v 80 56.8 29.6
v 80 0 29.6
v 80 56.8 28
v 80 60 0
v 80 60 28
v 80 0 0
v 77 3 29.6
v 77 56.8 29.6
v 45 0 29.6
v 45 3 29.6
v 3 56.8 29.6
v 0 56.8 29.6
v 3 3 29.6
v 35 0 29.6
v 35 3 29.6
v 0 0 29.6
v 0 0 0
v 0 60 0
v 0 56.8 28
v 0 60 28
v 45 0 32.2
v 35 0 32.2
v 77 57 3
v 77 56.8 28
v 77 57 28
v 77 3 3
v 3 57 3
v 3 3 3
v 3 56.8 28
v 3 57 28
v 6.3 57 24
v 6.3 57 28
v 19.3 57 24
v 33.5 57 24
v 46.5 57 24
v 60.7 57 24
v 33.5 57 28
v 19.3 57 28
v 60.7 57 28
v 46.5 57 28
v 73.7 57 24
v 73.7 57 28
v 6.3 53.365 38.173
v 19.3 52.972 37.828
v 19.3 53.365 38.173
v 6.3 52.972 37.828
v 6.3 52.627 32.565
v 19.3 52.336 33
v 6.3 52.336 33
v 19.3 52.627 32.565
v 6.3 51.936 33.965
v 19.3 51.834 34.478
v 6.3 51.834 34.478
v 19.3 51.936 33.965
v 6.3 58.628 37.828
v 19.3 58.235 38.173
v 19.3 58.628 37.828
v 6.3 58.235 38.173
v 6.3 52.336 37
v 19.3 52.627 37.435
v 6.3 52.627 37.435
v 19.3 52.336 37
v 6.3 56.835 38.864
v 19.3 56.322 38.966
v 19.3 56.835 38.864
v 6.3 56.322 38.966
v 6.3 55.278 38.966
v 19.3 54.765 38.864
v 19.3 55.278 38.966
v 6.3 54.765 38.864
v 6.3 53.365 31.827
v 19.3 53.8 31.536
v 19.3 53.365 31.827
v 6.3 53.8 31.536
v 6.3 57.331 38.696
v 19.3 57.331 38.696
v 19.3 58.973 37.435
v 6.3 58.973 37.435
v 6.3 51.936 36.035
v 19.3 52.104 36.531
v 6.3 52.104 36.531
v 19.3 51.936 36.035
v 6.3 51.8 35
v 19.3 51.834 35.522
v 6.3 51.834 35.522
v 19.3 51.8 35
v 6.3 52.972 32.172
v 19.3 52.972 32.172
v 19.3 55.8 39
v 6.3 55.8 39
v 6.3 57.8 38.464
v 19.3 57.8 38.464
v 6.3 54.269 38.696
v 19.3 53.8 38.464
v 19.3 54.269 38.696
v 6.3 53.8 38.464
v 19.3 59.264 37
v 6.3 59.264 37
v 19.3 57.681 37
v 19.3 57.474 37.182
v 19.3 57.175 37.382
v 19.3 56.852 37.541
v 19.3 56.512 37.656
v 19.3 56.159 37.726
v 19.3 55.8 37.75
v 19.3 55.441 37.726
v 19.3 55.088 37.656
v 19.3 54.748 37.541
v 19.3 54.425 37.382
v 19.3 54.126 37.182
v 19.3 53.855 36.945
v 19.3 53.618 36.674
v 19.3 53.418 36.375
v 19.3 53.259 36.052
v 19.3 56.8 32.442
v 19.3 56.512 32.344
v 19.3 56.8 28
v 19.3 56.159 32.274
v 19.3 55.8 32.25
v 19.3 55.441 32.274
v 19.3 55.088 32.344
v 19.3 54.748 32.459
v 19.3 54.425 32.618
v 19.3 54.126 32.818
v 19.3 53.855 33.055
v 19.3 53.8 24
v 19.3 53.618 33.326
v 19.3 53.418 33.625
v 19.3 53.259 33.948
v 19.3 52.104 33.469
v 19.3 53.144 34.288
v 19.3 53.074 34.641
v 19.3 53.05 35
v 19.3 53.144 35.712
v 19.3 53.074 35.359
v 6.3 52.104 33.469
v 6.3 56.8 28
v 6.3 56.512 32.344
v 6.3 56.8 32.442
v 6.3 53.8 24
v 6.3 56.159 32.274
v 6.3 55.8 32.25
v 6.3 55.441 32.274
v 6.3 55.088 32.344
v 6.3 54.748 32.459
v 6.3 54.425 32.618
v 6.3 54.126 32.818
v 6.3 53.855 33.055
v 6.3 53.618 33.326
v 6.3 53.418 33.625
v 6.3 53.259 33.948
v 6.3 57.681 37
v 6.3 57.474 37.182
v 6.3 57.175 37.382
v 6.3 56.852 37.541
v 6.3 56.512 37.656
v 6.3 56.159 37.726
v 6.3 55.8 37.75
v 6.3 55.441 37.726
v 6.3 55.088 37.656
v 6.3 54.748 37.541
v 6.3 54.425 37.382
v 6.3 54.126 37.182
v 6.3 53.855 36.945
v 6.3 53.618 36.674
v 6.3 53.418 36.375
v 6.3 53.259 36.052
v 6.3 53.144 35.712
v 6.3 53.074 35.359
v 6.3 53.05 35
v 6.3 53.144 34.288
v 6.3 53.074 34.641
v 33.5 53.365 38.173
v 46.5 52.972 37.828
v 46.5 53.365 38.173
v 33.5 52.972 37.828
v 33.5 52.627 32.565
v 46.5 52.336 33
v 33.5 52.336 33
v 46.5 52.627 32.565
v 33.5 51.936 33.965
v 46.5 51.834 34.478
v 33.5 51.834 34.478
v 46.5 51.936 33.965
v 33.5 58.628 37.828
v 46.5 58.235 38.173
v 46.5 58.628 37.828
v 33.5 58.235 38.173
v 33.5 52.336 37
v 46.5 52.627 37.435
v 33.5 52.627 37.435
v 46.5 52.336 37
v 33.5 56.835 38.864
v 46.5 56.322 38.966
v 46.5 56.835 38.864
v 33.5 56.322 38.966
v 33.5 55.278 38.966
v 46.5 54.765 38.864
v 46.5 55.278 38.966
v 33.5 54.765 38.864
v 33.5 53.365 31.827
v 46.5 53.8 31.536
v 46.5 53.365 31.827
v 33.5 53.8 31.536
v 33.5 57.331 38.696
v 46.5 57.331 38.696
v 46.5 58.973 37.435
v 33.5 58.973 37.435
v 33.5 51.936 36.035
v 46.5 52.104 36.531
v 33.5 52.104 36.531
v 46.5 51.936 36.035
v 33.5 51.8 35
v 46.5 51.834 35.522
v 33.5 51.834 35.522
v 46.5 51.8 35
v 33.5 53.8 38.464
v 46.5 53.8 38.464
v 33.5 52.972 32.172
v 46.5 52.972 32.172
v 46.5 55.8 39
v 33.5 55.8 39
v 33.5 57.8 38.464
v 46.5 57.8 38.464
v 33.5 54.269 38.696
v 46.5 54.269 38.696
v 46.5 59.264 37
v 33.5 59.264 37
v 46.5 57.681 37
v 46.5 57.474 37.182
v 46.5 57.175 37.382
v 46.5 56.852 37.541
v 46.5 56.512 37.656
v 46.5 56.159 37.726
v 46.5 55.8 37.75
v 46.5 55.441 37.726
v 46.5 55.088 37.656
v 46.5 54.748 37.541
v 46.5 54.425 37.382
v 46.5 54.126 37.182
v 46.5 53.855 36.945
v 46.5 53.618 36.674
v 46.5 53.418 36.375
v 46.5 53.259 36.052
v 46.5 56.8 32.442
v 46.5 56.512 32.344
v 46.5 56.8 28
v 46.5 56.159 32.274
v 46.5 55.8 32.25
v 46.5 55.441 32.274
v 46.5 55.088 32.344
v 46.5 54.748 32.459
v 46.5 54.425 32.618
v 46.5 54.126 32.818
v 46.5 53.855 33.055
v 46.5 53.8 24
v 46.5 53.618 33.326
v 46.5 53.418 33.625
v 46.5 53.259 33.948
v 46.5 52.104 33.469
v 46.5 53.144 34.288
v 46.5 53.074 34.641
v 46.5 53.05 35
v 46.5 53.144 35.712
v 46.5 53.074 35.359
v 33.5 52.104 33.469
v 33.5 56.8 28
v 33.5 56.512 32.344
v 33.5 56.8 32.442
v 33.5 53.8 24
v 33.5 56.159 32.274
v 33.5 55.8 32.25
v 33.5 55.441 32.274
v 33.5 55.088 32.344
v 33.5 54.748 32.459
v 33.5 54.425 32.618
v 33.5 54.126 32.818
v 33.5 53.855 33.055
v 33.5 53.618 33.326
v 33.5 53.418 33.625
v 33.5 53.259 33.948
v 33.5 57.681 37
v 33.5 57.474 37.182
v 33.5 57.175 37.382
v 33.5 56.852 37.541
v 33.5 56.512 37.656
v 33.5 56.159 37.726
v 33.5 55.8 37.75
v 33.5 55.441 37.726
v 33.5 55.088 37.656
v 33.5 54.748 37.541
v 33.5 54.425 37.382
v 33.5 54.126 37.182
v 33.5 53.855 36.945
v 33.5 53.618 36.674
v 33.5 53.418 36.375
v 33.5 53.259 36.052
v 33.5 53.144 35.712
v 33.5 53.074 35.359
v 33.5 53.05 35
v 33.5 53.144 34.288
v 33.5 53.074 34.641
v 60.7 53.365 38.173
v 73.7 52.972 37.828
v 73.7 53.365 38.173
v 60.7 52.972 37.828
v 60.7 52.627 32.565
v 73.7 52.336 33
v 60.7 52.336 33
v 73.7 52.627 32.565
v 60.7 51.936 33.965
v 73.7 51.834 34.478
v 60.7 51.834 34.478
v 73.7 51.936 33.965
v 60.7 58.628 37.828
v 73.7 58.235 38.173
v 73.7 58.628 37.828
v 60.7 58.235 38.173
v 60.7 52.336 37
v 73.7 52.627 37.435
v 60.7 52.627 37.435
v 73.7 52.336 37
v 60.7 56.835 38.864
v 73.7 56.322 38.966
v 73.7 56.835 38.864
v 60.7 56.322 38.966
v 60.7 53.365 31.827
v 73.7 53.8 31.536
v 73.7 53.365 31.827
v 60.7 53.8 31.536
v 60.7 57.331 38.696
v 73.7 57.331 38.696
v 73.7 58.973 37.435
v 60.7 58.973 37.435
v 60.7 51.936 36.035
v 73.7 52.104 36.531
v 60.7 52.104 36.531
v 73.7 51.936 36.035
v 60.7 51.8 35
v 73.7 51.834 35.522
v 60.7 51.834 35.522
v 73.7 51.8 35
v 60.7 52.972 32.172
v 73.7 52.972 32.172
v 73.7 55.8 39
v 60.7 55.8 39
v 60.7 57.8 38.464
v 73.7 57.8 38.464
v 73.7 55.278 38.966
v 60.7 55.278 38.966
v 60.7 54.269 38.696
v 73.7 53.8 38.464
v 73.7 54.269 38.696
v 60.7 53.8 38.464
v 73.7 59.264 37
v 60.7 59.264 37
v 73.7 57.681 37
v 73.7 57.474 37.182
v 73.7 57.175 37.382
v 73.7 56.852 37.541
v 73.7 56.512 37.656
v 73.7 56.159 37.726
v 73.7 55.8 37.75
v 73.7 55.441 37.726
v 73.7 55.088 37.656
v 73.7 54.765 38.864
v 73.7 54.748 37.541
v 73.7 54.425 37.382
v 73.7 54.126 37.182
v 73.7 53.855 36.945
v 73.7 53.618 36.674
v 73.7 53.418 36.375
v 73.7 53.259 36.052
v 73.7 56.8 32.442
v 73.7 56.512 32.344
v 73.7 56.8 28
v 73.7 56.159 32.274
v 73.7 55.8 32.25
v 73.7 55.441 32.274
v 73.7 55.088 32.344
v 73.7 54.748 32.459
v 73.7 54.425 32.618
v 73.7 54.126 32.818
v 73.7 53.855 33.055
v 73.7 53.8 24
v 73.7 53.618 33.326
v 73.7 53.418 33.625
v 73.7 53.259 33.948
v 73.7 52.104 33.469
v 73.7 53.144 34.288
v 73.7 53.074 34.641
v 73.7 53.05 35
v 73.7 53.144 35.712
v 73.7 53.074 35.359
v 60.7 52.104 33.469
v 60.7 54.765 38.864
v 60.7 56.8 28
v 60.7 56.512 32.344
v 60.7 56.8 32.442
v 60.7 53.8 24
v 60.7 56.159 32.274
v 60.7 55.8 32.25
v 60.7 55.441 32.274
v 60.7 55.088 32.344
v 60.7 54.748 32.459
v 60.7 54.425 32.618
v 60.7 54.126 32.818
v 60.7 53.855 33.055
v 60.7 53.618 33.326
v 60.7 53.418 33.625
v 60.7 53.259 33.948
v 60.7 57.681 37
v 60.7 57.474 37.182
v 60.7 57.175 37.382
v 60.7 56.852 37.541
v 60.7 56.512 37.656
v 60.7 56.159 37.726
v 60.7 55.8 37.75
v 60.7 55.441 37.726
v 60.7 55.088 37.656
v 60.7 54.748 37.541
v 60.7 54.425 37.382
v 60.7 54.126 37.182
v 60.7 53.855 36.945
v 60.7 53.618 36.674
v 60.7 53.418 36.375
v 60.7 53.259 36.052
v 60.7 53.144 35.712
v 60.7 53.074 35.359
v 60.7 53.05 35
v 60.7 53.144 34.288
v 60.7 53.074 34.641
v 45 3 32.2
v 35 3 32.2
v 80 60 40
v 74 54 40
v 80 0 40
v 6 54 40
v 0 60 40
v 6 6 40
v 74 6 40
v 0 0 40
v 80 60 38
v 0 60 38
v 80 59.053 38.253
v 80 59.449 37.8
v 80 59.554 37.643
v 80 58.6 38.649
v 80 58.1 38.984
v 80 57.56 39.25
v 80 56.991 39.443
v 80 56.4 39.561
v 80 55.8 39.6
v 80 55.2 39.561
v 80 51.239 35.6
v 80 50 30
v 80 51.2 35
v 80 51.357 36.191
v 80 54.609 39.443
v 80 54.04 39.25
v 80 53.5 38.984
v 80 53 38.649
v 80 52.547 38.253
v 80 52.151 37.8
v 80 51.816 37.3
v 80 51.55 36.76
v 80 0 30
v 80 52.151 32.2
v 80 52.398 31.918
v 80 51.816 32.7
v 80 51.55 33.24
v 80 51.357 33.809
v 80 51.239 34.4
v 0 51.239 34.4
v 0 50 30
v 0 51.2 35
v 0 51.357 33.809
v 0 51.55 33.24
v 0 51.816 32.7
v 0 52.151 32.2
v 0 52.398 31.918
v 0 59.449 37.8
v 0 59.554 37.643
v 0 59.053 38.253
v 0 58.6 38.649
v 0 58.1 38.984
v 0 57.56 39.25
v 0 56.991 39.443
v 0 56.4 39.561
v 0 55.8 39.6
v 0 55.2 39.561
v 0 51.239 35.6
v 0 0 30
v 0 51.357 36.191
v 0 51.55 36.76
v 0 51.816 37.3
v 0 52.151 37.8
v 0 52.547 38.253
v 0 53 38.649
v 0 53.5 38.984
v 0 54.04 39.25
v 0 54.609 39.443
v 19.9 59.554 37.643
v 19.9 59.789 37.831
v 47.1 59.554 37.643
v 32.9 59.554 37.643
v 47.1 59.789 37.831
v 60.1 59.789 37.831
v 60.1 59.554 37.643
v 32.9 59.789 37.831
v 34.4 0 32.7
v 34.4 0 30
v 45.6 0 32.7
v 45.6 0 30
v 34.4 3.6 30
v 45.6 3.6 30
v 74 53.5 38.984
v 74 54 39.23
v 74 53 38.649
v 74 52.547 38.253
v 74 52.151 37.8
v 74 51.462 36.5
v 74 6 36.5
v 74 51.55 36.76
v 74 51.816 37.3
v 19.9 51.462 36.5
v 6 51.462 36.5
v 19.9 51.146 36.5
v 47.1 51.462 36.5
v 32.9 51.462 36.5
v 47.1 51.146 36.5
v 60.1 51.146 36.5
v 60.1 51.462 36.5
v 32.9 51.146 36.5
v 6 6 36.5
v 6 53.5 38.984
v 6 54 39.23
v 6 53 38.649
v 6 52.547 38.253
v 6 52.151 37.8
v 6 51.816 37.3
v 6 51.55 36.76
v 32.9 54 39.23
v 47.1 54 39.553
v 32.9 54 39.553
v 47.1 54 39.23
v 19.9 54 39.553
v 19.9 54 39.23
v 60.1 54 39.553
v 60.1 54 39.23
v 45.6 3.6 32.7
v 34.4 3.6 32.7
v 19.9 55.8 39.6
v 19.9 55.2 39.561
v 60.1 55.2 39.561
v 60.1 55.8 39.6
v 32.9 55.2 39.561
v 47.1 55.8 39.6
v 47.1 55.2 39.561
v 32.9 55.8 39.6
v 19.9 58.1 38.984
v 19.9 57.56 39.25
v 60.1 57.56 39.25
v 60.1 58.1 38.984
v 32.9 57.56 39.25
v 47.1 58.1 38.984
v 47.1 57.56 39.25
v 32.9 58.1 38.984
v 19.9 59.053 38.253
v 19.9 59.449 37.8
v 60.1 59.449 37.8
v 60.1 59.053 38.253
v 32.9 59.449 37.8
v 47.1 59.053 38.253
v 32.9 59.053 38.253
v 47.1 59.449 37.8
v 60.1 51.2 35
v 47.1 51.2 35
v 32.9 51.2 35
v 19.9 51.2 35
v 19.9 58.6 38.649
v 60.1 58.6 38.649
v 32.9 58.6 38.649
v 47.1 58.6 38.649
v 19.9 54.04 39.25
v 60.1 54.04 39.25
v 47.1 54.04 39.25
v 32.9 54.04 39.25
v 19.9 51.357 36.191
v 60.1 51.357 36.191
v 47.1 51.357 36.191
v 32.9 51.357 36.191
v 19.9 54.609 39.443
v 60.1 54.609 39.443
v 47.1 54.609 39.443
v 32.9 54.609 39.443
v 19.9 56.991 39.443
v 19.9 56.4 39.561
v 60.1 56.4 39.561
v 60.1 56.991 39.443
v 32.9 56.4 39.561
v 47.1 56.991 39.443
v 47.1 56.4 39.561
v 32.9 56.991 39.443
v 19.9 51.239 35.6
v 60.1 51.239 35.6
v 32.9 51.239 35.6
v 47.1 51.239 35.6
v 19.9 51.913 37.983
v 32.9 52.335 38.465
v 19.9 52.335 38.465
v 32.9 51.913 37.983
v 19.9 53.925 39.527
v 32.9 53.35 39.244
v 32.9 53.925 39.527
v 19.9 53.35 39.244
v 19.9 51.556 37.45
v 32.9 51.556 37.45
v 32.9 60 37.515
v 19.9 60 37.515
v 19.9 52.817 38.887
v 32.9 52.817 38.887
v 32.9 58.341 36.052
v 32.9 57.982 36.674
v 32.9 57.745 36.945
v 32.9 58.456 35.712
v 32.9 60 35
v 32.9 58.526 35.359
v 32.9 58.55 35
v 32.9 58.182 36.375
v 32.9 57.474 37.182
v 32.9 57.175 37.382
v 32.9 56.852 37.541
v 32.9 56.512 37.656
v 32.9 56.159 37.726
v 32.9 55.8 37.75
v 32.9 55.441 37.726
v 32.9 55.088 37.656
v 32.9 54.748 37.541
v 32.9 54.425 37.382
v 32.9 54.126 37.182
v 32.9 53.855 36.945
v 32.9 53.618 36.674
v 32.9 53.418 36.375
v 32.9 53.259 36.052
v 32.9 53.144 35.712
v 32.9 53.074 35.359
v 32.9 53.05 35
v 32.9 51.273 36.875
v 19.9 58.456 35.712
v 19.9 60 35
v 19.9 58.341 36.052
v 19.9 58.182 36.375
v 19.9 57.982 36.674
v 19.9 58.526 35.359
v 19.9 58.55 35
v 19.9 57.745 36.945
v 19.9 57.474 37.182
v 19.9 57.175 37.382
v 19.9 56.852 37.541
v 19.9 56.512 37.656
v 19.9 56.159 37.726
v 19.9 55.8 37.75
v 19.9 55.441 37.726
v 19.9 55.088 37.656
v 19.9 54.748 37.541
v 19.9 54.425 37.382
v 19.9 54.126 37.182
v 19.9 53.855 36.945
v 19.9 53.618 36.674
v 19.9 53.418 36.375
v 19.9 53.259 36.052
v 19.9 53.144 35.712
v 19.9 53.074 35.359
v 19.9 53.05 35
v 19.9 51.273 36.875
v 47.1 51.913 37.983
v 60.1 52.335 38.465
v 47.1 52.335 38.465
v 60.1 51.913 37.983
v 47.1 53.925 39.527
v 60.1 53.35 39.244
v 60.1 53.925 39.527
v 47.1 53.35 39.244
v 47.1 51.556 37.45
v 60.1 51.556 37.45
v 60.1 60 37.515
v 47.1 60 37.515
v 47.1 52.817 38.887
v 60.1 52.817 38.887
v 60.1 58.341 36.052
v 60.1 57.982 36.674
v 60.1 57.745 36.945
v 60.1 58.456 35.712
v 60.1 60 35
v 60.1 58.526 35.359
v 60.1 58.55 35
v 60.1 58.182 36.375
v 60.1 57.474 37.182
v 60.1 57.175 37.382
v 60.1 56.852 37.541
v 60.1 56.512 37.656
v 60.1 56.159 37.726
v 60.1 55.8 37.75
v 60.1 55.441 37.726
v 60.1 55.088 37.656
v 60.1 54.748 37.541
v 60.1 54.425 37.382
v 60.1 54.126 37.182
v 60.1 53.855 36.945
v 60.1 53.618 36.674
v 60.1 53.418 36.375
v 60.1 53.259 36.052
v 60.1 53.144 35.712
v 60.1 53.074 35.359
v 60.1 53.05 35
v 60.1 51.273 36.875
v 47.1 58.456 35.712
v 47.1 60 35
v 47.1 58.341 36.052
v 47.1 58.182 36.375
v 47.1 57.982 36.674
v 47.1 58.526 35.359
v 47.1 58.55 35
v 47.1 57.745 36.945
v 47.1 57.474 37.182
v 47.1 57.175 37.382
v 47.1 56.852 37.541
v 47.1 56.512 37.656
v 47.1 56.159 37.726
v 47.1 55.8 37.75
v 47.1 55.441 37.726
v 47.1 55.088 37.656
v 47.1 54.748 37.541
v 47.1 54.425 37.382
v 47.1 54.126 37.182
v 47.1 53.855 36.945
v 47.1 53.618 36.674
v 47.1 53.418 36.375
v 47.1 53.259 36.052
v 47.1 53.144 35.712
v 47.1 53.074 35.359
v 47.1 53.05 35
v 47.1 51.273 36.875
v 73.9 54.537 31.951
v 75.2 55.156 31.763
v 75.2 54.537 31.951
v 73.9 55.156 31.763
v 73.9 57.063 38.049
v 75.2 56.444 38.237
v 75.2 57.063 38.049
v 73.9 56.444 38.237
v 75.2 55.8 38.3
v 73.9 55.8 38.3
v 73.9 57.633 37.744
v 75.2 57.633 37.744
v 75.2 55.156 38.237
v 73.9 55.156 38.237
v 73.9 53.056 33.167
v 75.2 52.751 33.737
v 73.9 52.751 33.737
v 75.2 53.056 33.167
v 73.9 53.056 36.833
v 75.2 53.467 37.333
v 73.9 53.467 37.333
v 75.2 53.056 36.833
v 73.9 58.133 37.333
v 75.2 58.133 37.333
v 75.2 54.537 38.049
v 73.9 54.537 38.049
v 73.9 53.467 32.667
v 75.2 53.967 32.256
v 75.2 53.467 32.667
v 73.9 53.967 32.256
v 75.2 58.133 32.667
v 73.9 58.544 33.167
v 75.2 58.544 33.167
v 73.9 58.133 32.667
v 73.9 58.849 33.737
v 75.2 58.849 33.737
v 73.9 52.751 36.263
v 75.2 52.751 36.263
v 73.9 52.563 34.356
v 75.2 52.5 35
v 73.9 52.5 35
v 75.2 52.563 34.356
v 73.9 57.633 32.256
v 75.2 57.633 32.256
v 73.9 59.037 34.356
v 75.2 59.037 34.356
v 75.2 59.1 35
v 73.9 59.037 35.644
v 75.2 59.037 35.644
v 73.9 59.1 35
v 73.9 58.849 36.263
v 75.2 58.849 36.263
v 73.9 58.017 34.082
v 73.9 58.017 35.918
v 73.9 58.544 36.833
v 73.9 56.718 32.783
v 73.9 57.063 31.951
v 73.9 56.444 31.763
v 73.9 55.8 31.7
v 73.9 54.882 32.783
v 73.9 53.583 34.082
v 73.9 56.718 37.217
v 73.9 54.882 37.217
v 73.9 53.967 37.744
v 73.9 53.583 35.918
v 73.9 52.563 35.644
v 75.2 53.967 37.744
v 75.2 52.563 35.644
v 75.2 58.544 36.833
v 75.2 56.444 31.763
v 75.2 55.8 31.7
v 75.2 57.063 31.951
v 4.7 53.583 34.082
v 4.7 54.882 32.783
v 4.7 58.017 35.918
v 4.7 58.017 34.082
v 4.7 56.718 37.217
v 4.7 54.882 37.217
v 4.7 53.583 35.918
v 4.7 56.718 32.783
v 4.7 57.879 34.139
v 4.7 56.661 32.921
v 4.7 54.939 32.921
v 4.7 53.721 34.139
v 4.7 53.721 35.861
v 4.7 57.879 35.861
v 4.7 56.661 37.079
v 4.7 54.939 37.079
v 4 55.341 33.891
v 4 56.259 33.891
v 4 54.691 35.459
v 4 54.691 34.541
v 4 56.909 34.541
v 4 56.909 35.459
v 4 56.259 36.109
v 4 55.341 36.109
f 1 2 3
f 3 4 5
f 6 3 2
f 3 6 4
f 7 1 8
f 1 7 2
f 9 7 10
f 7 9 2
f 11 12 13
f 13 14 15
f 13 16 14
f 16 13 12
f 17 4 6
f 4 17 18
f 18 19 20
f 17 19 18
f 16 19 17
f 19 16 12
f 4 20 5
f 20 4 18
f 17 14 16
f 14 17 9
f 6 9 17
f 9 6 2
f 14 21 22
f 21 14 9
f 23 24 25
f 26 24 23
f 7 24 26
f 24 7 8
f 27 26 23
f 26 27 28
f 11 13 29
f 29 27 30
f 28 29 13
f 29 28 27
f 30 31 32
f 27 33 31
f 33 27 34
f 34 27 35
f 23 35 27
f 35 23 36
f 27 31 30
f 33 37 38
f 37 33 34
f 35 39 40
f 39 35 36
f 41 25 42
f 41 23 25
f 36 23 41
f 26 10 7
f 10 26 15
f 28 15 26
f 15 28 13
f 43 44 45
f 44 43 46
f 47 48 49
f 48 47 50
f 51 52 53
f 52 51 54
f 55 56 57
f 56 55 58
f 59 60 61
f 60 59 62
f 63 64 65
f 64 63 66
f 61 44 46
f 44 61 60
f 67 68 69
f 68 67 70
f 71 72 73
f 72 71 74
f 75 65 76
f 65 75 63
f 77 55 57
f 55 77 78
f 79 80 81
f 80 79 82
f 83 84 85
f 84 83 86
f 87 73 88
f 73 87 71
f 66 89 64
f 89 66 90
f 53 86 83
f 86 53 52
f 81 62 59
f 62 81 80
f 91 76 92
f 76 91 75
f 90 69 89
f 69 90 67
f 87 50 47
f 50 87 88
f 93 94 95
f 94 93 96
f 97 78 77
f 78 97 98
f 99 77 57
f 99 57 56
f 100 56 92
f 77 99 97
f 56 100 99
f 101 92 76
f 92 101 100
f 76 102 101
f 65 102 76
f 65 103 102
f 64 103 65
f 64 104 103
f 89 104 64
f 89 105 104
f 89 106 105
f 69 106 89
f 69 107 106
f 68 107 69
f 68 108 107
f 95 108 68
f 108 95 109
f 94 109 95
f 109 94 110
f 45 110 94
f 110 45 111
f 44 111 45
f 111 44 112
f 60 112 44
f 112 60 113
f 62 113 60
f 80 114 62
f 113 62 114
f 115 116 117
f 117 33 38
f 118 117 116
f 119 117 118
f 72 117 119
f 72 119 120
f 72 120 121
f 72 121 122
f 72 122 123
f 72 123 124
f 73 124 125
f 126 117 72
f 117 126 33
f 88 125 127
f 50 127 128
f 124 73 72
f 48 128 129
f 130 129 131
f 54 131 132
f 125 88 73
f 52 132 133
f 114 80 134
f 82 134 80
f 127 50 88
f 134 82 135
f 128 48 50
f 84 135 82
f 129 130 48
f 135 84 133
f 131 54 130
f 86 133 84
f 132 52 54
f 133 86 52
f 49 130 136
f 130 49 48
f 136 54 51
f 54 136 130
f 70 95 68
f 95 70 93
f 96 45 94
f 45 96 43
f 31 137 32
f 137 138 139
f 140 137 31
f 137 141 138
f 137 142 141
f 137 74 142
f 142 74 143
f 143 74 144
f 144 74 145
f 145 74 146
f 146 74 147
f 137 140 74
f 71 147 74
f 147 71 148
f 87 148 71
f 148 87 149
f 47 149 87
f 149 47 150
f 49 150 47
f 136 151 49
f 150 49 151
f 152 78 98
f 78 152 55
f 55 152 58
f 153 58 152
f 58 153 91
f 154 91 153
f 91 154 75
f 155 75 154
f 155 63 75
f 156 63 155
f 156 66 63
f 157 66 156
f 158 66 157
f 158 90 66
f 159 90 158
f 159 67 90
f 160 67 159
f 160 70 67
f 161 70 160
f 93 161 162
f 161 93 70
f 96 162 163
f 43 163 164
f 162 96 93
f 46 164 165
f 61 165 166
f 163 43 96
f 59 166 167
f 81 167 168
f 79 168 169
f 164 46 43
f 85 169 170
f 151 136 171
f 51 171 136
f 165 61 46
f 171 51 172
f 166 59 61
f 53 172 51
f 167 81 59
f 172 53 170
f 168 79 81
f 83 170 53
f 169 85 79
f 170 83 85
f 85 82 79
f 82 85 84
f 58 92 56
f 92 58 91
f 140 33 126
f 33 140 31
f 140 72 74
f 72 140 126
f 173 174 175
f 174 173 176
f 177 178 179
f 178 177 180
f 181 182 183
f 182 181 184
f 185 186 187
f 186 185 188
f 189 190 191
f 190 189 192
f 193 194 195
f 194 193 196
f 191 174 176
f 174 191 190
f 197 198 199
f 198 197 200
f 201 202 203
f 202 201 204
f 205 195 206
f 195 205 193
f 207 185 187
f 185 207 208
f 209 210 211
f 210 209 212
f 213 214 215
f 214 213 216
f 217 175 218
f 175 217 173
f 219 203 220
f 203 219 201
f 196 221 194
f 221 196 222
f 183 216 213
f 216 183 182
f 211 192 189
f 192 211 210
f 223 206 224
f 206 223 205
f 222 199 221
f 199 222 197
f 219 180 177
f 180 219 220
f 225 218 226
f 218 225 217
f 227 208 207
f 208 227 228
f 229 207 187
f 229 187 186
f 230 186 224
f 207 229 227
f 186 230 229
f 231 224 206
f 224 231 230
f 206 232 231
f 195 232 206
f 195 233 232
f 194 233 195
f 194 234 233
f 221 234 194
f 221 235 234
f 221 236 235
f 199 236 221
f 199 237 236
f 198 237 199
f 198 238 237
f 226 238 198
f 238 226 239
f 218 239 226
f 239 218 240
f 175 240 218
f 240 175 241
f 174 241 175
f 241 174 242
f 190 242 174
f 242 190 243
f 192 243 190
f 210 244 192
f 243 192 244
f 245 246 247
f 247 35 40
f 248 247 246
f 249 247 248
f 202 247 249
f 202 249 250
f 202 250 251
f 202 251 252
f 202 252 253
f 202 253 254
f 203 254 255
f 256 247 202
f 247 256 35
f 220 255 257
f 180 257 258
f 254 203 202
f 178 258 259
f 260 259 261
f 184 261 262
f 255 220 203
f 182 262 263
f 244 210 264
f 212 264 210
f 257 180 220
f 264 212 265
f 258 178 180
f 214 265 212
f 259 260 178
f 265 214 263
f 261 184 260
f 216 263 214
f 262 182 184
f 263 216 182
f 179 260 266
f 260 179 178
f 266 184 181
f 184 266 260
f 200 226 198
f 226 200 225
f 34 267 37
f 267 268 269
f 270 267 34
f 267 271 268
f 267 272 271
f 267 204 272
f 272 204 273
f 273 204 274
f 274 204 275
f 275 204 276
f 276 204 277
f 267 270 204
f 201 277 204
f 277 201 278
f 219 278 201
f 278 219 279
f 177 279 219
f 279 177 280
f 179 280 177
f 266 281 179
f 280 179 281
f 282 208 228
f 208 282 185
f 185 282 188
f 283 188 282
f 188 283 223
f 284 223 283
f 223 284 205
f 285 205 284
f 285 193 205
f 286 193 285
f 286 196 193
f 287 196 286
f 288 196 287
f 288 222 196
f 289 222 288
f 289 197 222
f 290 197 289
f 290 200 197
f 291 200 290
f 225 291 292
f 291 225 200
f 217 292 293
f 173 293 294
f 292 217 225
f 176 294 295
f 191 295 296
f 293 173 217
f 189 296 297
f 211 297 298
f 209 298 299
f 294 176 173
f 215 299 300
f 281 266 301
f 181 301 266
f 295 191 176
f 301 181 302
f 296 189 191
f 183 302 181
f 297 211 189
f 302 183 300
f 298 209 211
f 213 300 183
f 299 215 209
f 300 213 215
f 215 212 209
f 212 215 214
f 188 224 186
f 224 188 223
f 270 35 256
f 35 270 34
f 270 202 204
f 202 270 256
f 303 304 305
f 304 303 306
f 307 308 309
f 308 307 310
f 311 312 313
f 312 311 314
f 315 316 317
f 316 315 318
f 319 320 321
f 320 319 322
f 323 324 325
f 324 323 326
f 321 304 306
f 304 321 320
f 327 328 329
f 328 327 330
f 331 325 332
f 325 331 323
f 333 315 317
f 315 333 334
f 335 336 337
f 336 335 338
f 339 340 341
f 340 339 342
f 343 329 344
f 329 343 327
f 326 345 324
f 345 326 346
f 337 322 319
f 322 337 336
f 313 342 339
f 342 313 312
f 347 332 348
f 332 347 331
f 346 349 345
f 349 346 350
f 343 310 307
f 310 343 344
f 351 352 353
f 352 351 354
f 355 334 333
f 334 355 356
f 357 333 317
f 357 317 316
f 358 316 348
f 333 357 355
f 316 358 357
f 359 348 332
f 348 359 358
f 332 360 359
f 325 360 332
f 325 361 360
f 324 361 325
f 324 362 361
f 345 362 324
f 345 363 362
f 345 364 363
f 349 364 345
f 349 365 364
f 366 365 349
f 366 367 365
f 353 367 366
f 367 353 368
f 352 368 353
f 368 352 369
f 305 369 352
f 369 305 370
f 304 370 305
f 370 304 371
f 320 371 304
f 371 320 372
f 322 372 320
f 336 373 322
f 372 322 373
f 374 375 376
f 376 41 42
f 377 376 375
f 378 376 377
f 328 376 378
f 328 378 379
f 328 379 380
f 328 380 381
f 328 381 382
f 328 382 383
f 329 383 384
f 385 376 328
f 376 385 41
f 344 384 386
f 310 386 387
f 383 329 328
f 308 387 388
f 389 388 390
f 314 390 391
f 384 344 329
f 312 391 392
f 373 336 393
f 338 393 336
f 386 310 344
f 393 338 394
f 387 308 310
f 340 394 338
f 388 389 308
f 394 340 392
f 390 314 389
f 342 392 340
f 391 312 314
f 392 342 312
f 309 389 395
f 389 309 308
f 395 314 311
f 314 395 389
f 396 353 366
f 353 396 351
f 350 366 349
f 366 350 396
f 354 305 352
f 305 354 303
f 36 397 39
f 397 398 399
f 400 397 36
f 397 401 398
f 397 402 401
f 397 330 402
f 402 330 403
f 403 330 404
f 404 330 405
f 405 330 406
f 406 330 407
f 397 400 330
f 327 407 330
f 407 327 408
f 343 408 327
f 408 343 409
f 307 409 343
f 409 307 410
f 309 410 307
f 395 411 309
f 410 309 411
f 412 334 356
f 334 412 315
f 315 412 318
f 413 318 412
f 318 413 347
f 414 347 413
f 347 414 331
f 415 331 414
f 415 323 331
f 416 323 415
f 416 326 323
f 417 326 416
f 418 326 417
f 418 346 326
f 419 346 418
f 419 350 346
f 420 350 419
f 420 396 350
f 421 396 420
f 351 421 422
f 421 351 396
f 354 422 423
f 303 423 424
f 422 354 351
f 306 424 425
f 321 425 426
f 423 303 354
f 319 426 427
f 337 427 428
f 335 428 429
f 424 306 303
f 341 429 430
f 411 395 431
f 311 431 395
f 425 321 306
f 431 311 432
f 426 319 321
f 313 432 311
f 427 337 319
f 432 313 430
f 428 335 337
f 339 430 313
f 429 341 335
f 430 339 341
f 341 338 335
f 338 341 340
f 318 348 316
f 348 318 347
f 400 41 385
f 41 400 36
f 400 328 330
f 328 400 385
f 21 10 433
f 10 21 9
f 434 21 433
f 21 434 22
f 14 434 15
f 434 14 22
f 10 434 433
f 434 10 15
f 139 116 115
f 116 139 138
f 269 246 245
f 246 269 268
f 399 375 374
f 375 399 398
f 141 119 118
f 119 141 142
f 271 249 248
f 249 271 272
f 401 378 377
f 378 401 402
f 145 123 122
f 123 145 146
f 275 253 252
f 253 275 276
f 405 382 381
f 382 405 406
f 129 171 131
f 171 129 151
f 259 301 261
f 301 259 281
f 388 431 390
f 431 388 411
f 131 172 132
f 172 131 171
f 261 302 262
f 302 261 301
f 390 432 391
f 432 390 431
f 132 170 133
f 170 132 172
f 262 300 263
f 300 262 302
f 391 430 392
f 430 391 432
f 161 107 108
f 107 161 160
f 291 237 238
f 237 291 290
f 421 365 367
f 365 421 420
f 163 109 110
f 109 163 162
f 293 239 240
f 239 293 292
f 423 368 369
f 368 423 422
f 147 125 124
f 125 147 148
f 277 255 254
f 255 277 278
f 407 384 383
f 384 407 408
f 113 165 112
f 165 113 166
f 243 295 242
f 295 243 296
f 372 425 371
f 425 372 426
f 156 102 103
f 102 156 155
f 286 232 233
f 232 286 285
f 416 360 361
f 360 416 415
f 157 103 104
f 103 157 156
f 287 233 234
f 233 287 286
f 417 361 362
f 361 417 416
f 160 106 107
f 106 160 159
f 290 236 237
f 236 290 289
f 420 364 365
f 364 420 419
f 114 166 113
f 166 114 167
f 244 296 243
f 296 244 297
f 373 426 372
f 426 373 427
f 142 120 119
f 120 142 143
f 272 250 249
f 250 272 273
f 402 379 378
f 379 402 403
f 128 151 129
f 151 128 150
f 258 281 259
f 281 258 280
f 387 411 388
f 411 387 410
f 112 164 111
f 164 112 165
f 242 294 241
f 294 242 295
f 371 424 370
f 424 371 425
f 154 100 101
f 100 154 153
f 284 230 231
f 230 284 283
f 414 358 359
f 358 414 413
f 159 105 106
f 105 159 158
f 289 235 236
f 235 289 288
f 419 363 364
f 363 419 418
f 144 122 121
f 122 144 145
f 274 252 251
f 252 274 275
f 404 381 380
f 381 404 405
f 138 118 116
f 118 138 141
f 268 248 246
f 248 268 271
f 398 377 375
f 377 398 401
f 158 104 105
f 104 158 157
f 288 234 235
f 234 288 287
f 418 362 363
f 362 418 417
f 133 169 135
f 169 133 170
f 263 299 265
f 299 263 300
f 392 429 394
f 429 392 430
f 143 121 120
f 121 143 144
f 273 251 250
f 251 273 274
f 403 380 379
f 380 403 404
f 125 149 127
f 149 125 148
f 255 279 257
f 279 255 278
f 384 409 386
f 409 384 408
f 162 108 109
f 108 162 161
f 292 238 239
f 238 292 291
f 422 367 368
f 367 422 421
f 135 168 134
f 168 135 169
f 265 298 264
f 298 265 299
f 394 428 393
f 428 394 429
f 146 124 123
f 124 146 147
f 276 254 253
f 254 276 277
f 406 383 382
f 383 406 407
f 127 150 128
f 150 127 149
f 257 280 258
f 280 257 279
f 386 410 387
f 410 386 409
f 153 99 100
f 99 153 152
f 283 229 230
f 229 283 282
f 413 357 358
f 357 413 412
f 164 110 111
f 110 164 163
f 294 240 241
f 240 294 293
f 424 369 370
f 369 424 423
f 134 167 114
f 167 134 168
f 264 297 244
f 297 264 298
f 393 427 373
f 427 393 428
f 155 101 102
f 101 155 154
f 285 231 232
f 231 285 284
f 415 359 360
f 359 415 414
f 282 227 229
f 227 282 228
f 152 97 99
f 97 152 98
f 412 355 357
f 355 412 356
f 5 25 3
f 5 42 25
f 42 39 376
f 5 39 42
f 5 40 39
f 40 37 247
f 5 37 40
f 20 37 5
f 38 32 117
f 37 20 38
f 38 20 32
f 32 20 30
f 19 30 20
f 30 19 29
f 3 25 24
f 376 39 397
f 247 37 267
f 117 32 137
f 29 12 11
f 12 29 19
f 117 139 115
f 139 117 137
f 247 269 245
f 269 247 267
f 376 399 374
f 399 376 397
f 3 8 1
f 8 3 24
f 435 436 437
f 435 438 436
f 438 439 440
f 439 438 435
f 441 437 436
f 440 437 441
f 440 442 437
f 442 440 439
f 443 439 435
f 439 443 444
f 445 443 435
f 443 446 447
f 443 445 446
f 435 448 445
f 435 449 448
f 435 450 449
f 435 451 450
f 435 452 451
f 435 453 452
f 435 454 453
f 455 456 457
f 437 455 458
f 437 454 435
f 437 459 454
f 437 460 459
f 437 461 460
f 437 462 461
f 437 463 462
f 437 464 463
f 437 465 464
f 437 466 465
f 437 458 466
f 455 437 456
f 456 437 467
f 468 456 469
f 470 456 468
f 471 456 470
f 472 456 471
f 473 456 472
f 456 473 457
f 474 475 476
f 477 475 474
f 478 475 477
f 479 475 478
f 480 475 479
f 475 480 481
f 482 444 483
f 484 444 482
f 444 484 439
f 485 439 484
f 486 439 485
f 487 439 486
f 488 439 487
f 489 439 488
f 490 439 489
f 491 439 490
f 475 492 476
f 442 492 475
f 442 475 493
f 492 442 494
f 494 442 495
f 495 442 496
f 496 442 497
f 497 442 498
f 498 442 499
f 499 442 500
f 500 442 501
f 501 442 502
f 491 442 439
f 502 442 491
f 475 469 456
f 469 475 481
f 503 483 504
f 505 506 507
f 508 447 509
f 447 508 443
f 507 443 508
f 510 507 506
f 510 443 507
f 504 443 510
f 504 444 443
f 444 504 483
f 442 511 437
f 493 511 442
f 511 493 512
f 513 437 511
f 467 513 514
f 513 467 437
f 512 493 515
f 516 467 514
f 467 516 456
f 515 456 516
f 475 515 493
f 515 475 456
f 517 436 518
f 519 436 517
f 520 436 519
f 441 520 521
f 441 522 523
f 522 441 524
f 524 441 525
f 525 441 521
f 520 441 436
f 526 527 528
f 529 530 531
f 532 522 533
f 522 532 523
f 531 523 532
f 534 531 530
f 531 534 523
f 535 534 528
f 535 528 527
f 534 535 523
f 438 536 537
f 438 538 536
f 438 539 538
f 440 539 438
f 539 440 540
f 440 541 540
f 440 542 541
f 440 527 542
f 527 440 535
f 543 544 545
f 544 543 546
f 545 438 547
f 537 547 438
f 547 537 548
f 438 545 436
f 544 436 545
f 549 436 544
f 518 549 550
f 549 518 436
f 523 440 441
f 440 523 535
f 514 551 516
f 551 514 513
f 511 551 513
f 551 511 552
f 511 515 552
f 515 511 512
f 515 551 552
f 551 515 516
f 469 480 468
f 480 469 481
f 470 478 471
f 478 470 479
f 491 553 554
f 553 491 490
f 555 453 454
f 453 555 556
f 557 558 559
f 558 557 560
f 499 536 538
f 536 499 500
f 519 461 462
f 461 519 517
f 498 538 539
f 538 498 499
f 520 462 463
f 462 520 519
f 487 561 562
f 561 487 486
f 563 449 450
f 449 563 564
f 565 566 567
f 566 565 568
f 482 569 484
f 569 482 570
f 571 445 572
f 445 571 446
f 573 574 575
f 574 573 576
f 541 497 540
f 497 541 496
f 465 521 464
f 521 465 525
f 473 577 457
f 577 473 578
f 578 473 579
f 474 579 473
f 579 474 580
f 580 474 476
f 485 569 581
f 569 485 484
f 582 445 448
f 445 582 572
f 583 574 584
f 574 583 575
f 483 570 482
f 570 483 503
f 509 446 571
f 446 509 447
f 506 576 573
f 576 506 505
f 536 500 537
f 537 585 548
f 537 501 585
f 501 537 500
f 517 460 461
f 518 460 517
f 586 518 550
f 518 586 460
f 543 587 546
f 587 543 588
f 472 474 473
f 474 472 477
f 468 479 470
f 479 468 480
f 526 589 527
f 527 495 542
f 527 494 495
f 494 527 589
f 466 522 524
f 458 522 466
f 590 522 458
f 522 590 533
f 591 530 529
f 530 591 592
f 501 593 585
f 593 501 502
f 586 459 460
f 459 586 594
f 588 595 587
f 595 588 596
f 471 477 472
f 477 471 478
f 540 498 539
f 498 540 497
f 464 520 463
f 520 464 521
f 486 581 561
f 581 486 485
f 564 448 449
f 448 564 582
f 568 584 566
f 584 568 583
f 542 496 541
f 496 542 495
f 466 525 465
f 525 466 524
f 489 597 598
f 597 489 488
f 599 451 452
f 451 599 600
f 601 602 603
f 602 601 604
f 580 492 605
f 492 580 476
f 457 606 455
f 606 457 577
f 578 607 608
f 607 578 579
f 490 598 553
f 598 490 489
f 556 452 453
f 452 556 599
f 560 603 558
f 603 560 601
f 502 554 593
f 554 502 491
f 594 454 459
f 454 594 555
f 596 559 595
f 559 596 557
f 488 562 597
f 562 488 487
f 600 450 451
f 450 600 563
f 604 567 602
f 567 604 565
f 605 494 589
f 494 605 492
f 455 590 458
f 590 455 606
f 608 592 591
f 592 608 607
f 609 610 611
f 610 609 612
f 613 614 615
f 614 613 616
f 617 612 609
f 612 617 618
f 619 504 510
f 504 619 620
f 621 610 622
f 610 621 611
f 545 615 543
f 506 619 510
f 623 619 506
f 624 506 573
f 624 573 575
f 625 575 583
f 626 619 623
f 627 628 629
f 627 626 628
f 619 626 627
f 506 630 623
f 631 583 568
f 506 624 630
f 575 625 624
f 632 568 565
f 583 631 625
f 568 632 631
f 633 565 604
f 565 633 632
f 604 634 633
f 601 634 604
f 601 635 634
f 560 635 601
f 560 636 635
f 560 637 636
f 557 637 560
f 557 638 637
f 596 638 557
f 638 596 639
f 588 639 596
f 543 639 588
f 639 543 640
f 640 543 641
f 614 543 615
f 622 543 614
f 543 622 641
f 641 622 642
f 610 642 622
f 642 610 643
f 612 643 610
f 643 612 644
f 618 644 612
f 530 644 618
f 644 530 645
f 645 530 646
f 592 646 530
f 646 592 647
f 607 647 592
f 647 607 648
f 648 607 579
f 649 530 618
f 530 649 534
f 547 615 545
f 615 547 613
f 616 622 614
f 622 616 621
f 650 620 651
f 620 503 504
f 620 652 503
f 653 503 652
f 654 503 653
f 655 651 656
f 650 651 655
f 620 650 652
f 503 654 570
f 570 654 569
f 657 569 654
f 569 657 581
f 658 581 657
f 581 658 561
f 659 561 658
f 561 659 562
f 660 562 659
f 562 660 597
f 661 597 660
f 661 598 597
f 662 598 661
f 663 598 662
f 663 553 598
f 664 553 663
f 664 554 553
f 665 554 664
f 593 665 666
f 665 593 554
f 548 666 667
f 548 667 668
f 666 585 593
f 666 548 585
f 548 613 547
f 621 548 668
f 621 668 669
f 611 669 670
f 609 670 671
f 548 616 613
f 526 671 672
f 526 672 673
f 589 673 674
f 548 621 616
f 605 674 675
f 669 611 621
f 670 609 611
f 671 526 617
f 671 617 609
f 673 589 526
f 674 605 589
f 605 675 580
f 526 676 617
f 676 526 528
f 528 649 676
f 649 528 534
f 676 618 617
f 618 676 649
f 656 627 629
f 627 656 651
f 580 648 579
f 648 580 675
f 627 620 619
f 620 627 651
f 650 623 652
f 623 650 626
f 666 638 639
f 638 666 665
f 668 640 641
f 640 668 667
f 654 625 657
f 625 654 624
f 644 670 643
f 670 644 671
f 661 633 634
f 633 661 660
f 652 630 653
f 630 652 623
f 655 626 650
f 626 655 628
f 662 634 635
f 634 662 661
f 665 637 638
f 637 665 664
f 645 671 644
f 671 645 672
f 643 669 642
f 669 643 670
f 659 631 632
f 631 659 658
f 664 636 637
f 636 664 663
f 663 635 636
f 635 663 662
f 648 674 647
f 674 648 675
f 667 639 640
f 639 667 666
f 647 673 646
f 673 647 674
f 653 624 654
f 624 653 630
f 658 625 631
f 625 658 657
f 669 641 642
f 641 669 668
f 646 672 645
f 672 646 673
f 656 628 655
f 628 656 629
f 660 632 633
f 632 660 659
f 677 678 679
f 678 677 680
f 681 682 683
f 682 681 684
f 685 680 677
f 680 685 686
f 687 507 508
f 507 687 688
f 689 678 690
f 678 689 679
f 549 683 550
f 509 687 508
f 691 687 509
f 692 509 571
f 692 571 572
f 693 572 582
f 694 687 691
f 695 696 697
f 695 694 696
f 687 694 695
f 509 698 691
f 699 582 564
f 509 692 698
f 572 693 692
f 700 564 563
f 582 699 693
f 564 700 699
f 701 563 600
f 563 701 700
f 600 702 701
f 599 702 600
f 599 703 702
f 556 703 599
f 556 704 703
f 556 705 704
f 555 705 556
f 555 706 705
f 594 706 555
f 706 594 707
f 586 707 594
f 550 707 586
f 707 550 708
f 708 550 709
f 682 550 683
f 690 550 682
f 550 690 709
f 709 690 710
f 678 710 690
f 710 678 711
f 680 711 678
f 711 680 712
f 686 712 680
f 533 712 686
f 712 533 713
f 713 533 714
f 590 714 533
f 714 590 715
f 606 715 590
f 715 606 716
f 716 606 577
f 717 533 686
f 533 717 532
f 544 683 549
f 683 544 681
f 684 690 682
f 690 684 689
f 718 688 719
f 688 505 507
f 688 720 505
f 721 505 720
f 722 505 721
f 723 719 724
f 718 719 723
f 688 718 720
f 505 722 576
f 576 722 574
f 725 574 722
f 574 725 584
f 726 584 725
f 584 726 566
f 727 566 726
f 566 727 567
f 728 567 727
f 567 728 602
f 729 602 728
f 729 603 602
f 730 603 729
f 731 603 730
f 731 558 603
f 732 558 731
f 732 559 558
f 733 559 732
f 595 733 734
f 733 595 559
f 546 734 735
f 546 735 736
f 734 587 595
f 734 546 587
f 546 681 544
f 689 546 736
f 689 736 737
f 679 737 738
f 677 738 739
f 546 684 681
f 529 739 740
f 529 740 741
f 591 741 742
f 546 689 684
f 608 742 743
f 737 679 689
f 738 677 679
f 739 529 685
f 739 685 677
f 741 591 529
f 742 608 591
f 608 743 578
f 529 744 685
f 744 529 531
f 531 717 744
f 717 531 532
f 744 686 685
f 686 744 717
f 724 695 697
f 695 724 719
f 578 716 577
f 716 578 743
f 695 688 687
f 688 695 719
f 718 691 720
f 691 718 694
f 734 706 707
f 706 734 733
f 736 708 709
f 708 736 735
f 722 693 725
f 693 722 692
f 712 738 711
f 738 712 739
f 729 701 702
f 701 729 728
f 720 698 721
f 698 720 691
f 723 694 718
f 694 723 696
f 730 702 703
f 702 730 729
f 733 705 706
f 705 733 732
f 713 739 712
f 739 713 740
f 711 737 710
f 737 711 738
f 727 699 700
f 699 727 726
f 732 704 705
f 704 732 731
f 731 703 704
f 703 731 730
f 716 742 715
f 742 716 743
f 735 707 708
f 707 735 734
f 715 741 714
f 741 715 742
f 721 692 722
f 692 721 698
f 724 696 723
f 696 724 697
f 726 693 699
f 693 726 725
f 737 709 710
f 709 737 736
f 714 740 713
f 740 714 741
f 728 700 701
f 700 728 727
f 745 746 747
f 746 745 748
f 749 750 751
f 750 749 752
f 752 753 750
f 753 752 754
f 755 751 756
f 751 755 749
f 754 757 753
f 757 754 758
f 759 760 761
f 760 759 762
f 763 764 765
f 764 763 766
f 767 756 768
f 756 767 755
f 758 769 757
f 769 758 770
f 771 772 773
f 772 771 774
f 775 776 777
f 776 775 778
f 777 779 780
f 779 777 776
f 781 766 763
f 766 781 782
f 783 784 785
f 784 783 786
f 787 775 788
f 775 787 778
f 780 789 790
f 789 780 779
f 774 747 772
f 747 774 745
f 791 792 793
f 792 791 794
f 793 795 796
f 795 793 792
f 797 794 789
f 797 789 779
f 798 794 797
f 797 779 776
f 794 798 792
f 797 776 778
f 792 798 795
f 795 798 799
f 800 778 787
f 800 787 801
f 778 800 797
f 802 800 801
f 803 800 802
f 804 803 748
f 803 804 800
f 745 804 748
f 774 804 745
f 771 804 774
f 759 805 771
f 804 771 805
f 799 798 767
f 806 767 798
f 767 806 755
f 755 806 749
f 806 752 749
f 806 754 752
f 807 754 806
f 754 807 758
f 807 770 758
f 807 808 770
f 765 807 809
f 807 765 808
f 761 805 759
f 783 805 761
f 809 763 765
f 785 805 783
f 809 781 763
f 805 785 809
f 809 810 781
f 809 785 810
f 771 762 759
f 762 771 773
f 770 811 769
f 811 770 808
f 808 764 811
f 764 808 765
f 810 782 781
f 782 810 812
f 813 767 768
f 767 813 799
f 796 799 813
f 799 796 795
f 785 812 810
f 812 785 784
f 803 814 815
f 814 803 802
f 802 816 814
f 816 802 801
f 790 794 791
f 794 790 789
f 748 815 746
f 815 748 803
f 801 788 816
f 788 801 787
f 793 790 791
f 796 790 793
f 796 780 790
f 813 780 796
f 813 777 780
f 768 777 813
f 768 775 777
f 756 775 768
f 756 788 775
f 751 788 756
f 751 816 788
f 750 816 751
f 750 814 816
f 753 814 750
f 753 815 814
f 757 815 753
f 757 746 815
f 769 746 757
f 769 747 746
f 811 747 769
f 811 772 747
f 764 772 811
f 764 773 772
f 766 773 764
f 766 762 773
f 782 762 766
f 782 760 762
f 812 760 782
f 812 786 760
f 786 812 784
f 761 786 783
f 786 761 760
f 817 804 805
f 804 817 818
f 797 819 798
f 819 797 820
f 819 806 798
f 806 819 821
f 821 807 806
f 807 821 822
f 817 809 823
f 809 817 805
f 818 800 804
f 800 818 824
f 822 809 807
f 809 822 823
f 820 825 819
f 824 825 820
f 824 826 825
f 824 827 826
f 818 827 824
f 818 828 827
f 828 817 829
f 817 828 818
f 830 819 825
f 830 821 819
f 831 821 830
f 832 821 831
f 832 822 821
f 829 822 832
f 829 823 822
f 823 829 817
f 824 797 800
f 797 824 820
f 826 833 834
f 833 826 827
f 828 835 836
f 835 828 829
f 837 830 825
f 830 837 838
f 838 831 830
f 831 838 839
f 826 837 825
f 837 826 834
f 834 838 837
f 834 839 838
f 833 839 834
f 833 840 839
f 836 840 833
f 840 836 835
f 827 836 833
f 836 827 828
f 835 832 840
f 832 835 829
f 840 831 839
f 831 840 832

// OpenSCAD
// Print-in-place hinged box, 80 x 60 x 40 mm closed.
// Printed closed in PLA (Bambu A1, 0.4 nozzle): base, lid and a captive
// hinge pin are separate bodies with 0.35-0.6 mm clearances, so the hinge
// breaks free by hand.  No supports: the lid underside bridges the cavity,
// the hinge barrels/pin use faceted (octagonal) lower surfaces, and all
// other downward faces are short bridges or rest on the body below.

/* [Part] */
part = "assembly"; // [assembly, box, lid, pin]

/* [Dimensions] */
box_w = 80;          // X, outside
box_d = 60;          // Y, outside (front y=0, back y=60)
box_h = 29.6;        // base height to its rim
lid_h = 10;          // lid height; lid bottom at z=30 (0.4 gap)
lid_z = 30;
wall = 3;
floor_t = 3;
total_h = 40;

hinge_y = 55.8;      // hinge axis, assembly coords
hinge_z = 35;
barrel_r = 4.0;
pin_r = 2.4;         // octagon circumradius
bore_r = 2.75;       // pin_r + 0.35 radial clearance
relief_r = 4.6;      // barrel_r + 0.6

// Alternating knuckles along the back edge (x intervals), 0.6 mm end gaps.
box_segs  = [[6.3, 19.3], [33.5, 46.5], [60.7, 73.7]];
lid_segs  = [[19.9, 32.9], [47.1, 60.1]];

cadverify_only = "";
module instance(name, part_name, unit = 1) {
    echo(cadverify_instance = [name, part_name, unit]);
    if (cadverify_only == "" || cadverify_only == name) children();
}

// ---------------------------------------------------------------- base (box)
module box_main() {
    difference() {
        union() {
            // shell: outer block minus open-top cavity
            difference() {
                cube([box_w, box_d, box_h]);
                translate([wall, wall, floor_t]) cube([box_w - 2 * wall, box_d - 2 * wall, box_h]);
            }
            // hinge knuckles (base) + support posts down to the back wall
            for (s = box_segs) {
                translate([s[0], hinge_y, hinge_z]) rotate([0, 90, 0])
                    cylinder(h = s[1] - s[0], r = barrel_r, $fn = 48);
                translate([s[0], 53.8, 24]) cube([s[1] - s[0], 6.2, 11.5]);
            }
            // front catch tooth (enters the socket in the lid)
            translate([35, 0, box_h]) cube([10, wall, 2.6]);
        }
        // pin bore through the base knuckles
        translate([-1, hinge_y, hinge_z]) rotate([0, 90, 0])
            cylinder(h = box_w + 2, r = bore_r, $fn = 48);
        // swing clearance notch: rear strip of wall/posts above z=28,
        // behind y=56.8, so the lid's rear lip clears it past 90 deg
        translate([-1, 56.8, 28]) cube([box_w + 2, 5, 9]);
    }
}

// ---------------------------------------------------------------- lid (local: z 0..10, hinge axis at z=5)
module lid_main() {
    union() {
        difference() {
            union() {
                // main slab, side profile (Y-Z) extruded along X.
                // Rear lower edge chamfered 50,0 -> 60,8 so the slab
                // swings clear of the base back wall.
                rotate([0, 90, 0])
                    linear_extrude(height = box_w)
                        polygon(points = [[0, 0], [0, 50], [-8, 60], [-10, 60], [-10, 0]]);
                // hinge knuckles (lid)
                for (s = lid_segs)
                    translate([s[0], hinge_y, 5]) rotate([0, 90, 0])
                        cylinder(h = s[1] - s[0], r = barrel_r, $fn = 48);
            }
            // recessed panel in the top face
            translate([6, 6, 6.5]) cube([68, 48, 4]);
            // front catch socket (tooth: x35..45, z assy 29.6..32.2)
            translate([34.4, -1, -0.5]) cube([11.2, 4.6, 3.2]);
            // clearance tunnel for the base knuckles / pin
            translate([-1, hinge_y, 5]) rotate([0, 90, 0])
                cylinder(h = box_w + 2, r = relief_r, $fn = 48);
            // pin bore through the lid knuckles
            translate([-1, hinge_y, 5]) rotate([0, 90, 0])
                cylinder(h = box_w + 2, r = bore_r, $fn = 48);
        }
        // webs joining lid knuckles to the slab: upper half-discs r=4.9
        // (stay above z=30.1 in assembly, clear of the base rim at 29.6)
        for (s = lid_segs)
            difference() {
                intersection() {
                    translate([s[0], hinge_y, 5]) rotate([0, 90, 0])
                        cylinder(h = s[1] - s[0], r = 4.9, $fn = 48);
                    translate([s[0], hinge_y - 10, 5]) cube([s[1] - s[0], 20, 5]);
                    translate([s[0], 0, 0]) cube([s[1] - s[0], box_d, lid_h]);
                }
                translate([s[0] - 1, hinge_y, 5]) rotate([0, 90, 0])
                    cylinder(h = s[1] - s[0] + 2, r = bore_r, $fn = 48);
            }
    }
}

// ---------------------------------------------------------------- pin
// Centred on its axis, local +Z from head (z=0) to tip (z=71.2).
module pin_geom() {
    union() {
        cylinder(h = 1.3, r = 3.3, $fn = 32);                    // head
        translate([0, 0, 1.0]) rotate([0, 0, 22.5])
            cylinder(h = 69.5, r = pin_r, $fn = 8);              // octagonal shaft
        translate([0, 0, 70.4]) rotate([0, 0, 22.5])
            cylinder(h = 0.8, r1 = pin_r, r2 = 1.2, $fn = 8);    // lead-in tip
    }
}
module pin_part() { translate([3.3, 3.3, 0]) pin_geom(); }

// ---------------------------------------------------------------- output
if (part == "box") {
    echo(cadverify_spec = [
        ["bounds", [[0, 0, 0], [box_w, box_d, hinge_z + barrel_r]]],
        ["bodies", 1],
        ["copies", 1],
        ["support_faces", [["bed", "-z", 4000]]],
        ["overhangs_allowed", [["hinge knuckles and pin bore print in place; faceted bore ceiling is a short internal bridge", [[5, 51, 30], [75, 60, 39.5]]], ["knuckle support ledge underside, 3.2 mm protrusion bridging to the back wall", [[5, 53, 23], [75, 58, 25]]]]],
        ["details", [
            ["cavity", "void", [[4, 4, 10], [76, 53, 29]], 0.95],
            ["front_wall", "thickness", [40, -1, 15], [0, 1, 0], 3],
            ["floor", "thickness", [40, 30, -1], [0, 0, 1], 3],
            ["box_knuckle", "material", [[7, 52, 33.5], [18, 53.8, 36.5]], 0.6],
            ["pin_bore", "void", [[8, 54.9, 34.1], [17, 56.7, 35.9]], 0.9],
            ["catch_tooth", "material", [[36, 0.5, 30], [44, 2.5, 32]], 0.85],
            ["hinge_knuckles", "view", [[4, 50, 28], [76, 60, 39.5]]]
        ]]
    ]);
    box_main();
} else if (part == "lid") {
    echo(cadverify_spec = [
        ["bounds", [[0, 0, 0], [box_w, box_d, lid_h]]],
        ["bodies", 1],
        ["copies", 1],
        ["support_faces", [["print_face", "-z", 3000]]],
        ["overhangs_allowed", [["lid hinge relief, knuckle bores and rear swing chamfer print in place around pin and box knuckles; ceilings are short internal bridges and the chamfer is 51 deg", [[0, 49, 0], [80, 60, 10]]], ["catch socket ceiling, 11 mm bridge across the socket", [[33, 0, 2], [47, 4, 3.5]]]]],
        ["details", [
            ["top_pocket", "void", [[7, 7, 6.6], [73, 53, 9.9]], 0.95],
            ["lid_slab", "thickness", [40, 30, 9], [0, 0, -1], 6.5],
            ["lid_knuckle", "material", [[21, 52, 3.5], [32, 53.8, 6.5]], 0.45],
            ["pin_bore", "void", [[22, 55.4, 4.6], [31, 56.2, 5.4]], 0.45],
            ["catch_socket", "void", [[35, 0.5, 0.2], [45, 2.5, 2.5]], 0.9],
            ["hinge_knuckles", "view", [[4, 50, 0], [76, 60, 10]]]
        ]]
    ]);
    lid_main();
} else if (part == "pin") {
    echo(cadverify_spec = [
        ["bounds", [[0, 0, 0], [6.6, 6.6, 71.2]]],
        ["bodies", 1],
        ["copies", 1],
        ["support_faces", [["head_base", "-z", 30]]],
        ["overhangs_allowed", []],
        ["details", [
            ["pin_shaft", "material", [[2, 2, 10], [4.6, 4.6, 20]], 0.9],
            ["pin_head", "material", [[1, 1, 0.1], [5.6, 5.6, 1.2]], 0.75],
            ["pin_length", "thickness", [1.2, 3.3, 72], [0, 0, -1], 71.2],
            ["pin_head_view", "view", [[0, 0, 0], [6.6, 6.6, 2]]]
        ]]
    ]);
    pin_part();
} else if (part == "assembly") {
    echo(cadverify_spec = [
        ["bounds", [[0, 0, 0], [box_w, box_d, total_h]]],
        ["support_faces", [["bed", "-z", 4000]]],
        ["allowed_interferences", []],
        ["motions", [
            ["lid_swing", ["lid"], "rotate", [0, hinge_y, hinge_z], [-1, 0, 0], [0, 110]]
        ]],
        ["assembly_order", [
            [["base"], [0, 0, 0]],
            [["lid"], [0, 0, -1]],
            [["pin"], [-1, 0, 0]]
        ]]
    ]);
    instance("base", "box") box_main();
    instance("lid", "lid") translate([0, 0, lid_z]) lid_main();
    instance("pin", "pin") translate([75.2, hinge_y, hinge_z]) rotate([0, -90, 0]) pin_geom();
}
